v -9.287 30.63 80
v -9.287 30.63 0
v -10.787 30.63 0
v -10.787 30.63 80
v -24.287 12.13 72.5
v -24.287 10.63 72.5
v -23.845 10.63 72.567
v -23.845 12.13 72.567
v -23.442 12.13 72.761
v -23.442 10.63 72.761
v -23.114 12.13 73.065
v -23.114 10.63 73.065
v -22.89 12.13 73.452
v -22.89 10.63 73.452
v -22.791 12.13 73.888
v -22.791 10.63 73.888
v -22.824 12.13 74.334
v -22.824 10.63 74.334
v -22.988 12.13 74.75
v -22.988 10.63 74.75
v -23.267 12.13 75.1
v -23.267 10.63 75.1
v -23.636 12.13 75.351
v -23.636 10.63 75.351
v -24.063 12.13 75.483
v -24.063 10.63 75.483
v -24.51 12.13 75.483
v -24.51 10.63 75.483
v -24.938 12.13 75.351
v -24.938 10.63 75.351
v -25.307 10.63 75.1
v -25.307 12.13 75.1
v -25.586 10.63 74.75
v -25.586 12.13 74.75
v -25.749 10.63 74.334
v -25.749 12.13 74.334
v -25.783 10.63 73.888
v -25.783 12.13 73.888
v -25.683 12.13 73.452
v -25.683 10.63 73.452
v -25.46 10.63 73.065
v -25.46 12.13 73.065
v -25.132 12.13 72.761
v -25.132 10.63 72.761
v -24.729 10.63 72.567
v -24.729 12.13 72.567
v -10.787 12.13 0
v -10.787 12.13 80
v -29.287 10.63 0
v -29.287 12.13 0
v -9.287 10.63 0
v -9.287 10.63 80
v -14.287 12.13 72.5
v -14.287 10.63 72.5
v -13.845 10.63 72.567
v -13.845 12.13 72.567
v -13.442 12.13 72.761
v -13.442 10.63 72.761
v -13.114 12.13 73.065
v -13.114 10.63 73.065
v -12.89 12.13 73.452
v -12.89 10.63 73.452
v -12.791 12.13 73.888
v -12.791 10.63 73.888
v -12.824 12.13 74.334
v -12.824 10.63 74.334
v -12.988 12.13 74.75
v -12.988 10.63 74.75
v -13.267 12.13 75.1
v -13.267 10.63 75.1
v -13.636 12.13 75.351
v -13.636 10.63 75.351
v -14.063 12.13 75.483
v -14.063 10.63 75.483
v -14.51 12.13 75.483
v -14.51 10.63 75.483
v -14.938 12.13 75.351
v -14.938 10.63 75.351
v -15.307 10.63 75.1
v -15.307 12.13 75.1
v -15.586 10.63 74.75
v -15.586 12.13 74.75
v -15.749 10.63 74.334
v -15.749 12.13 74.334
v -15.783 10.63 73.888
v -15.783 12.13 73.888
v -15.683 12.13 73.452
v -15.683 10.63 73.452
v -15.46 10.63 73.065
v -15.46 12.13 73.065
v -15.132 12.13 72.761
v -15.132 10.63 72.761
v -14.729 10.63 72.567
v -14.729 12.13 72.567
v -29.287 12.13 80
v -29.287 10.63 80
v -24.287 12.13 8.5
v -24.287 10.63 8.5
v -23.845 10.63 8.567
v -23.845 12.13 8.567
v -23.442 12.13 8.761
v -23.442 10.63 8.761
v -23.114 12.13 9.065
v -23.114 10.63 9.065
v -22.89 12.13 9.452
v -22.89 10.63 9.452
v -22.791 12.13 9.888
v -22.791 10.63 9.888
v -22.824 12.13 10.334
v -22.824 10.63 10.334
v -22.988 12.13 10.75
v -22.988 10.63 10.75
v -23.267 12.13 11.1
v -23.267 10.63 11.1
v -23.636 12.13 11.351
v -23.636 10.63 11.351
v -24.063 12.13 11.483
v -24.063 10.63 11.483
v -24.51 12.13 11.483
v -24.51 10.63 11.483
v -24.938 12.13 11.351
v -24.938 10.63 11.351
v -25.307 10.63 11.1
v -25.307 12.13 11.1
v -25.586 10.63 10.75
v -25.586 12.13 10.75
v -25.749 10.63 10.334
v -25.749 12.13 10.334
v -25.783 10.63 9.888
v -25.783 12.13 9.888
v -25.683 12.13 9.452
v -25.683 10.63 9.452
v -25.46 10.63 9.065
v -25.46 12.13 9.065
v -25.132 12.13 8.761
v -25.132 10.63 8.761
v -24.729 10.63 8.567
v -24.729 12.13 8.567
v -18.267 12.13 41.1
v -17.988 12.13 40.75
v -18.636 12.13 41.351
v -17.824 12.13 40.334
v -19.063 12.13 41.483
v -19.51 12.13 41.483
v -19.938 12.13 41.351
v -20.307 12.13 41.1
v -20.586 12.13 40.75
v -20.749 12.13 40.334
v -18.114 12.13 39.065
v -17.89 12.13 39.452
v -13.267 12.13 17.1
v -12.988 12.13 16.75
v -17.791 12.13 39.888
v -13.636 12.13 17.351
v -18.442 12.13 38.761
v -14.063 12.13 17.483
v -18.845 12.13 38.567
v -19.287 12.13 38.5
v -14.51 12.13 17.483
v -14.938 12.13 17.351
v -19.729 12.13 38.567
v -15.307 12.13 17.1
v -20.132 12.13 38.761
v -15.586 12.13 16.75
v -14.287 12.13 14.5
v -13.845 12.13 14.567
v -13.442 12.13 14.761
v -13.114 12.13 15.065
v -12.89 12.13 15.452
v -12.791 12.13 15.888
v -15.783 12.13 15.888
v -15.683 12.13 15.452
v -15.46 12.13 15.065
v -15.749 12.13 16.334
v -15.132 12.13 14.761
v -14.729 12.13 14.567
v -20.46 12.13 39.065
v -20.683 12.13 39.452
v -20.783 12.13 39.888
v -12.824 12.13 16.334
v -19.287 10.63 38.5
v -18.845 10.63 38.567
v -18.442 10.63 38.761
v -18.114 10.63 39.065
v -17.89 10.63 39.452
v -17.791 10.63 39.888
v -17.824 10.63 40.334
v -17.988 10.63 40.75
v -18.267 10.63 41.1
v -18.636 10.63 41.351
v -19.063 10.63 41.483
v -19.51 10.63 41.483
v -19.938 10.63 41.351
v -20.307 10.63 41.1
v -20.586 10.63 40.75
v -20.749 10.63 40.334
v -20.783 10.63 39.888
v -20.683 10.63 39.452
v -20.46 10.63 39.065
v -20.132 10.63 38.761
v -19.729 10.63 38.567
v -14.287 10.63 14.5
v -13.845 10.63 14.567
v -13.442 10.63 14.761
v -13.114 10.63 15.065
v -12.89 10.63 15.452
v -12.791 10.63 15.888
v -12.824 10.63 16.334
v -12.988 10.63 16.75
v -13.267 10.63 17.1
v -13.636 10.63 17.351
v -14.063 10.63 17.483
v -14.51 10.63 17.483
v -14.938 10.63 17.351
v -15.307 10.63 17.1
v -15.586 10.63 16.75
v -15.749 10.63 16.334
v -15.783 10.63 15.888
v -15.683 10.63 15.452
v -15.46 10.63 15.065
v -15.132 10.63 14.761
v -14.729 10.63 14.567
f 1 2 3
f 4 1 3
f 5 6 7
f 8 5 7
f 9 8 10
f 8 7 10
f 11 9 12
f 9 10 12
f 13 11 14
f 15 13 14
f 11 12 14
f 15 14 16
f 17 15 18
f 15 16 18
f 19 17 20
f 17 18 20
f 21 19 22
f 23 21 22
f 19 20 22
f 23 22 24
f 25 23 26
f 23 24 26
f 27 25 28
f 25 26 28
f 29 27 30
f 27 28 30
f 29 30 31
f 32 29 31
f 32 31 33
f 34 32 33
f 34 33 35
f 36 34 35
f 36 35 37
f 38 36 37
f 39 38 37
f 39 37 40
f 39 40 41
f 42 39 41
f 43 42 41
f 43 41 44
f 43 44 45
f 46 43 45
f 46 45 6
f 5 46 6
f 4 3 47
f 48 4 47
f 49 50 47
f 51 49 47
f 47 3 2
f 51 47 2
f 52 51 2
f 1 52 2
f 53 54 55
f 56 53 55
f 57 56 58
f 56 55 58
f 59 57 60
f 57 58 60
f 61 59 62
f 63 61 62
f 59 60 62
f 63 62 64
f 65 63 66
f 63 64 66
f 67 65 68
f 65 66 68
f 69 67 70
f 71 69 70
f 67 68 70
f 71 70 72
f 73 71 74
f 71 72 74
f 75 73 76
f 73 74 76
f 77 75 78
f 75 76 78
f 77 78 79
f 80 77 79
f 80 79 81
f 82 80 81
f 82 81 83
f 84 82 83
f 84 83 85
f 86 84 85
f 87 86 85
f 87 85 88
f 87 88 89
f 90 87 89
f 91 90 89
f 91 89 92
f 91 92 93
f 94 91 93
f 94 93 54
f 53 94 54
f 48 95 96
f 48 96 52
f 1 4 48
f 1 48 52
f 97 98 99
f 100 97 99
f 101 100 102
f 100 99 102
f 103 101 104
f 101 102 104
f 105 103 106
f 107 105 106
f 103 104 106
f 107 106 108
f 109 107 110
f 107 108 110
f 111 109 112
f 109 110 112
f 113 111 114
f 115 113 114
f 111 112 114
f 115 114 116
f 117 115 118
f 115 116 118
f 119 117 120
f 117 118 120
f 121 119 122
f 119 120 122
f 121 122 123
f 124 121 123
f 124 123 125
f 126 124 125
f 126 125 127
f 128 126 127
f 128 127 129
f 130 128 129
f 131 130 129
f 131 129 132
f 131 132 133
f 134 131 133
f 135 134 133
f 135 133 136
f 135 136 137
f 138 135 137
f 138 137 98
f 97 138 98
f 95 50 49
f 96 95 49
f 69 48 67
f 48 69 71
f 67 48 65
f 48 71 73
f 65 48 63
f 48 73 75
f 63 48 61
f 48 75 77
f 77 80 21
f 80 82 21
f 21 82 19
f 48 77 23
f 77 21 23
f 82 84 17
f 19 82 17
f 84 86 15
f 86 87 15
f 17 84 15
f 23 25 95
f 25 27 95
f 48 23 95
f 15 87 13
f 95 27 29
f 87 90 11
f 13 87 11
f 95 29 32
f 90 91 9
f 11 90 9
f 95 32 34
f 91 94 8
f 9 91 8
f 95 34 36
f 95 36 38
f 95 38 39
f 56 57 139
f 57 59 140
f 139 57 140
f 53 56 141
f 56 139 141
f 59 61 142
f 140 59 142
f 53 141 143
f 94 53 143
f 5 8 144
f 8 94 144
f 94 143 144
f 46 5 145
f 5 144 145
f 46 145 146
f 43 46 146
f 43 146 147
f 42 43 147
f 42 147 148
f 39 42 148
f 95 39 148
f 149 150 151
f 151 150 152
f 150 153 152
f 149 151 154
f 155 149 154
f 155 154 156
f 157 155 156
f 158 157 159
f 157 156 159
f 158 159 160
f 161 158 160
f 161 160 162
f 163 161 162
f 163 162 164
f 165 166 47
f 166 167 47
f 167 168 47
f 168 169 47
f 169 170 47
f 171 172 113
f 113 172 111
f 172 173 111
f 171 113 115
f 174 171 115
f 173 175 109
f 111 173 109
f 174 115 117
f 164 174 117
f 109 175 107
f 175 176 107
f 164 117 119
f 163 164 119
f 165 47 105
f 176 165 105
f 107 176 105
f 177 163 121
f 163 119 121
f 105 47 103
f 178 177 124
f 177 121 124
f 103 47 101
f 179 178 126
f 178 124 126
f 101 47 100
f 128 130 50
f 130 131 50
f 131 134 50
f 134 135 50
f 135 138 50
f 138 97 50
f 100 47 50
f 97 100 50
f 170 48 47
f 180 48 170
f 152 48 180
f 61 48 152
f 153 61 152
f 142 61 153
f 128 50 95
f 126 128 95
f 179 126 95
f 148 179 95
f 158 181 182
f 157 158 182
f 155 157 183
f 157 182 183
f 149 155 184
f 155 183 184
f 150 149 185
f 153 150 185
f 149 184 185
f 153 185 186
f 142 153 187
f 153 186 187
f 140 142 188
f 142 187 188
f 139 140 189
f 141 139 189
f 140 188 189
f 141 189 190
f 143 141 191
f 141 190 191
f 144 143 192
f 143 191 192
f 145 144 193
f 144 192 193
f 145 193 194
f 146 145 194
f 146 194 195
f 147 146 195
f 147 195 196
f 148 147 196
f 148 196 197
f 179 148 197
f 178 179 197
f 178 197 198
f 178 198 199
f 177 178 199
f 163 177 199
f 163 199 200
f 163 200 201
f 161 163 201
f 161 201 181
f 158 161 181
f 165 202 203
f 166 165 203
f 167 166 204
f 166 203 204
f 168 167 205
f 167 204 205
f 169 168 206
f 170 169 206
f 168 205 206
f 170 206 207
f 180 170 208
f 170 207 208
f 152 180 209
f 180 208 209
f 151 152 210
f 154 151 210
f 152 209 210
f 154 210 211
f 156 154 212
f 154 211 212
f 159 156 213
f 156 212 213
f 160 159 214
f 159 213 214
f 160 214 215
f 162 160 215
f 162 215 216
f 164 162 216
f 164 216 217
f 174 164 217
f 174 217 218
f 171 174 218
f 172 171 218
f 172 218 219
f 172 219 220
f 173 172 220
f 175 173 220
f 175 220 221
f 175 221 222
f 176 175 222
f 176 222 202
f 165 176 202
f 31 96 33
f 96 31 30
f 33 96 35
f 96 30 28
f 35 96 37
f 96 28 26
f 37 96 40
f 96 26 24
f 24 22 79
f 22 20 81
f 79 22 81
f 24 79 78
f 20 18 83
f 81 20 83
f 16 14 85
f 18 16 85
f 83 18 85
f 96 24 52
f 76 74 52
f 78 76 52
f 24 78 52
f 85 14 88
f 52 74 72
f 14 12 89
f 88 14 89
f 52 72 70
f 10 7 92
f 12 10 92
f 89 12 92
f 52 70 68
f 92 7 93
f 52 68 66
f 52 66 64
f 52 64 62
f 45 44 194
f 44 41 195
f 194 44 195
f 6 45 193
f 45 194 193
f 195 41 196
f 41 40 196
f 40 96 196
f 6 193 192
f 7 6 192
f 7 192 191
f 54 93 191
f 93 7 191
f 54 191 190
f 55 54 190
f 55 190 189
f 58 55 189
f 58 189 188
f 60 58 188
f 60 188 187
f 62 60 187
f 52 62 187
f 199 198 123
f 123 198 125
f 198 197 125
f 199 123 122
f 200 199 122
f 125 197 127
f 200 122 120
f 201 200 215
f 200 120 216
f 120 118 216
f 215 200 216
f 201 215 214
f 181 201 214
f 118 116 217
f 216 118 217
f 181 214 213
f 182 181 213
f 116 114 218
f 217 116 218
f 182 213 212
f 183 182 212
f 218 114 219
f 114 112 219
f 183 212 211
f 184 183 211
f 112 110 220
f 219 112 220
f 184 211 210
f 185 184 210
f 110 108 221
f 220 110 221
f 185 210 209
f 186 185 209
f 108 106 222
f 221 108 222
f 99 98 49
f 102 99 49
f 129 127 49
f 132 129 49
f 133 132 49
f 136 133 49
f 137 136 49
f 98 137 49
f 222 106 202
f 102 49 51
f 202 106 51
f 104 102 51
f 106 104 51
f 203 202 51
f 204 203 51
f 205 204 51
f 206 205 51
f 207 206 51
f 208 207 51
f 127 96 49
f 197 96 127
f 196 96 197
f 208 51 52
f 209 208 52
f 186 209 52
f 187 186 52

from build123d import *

# Parameters (mm, degrees)
EXTRUSION1_DEPTH = 80
ESQUISSE2_R      = 1.5
EXTRUSION2_DEPTH = 80


with BuildPart() as part:
    # Esquisse1 → Extrusion1 (new body)
    with BuildSketch(Plane.XY):
        Polygon((-29.286808535, 12.129808714), (-29.286808535, 10.629808714), (-9.286808535, 10.629808714), (-9.286808535, 30.629808714), (-10.786808535, 30.629808714), (-10.786808535, 12.129808714), align=None)
    extrude(amount=EXTRUSION1_DEPTH)

    # Esquisse2 → Extrusion2 (cut)
    with BuildSketch(Plane.XZ.offset(-10.629808714)):
        with Locations(Location((-14.286808535, 74, 0), (0, 0, 270))):
            Circle(ESQUISSE2_R)
        with Locations(Location((-24.286808535, 74, 0), (0, 0, 270))):
            Circle(ESQUISSE2_R)
        with Locations(Location((-14.286808535, 16, 0), (0, 0, 270))):
            Circle(ESQUISSE2_R)
        with Locations(Location((-24.286808535, 10, 0), (0, 0, 270))):
            Circle(ESQUISSE2_R)
        with Locations(Location((-19.286808535, 40, 0), (0, 0, 270))):
            Circle(ESQUISSE2_R)
    extrude(amount=-EXTRUSION2_DEPTH, mode=Mode.SUBTRACT)


solid = part.part
